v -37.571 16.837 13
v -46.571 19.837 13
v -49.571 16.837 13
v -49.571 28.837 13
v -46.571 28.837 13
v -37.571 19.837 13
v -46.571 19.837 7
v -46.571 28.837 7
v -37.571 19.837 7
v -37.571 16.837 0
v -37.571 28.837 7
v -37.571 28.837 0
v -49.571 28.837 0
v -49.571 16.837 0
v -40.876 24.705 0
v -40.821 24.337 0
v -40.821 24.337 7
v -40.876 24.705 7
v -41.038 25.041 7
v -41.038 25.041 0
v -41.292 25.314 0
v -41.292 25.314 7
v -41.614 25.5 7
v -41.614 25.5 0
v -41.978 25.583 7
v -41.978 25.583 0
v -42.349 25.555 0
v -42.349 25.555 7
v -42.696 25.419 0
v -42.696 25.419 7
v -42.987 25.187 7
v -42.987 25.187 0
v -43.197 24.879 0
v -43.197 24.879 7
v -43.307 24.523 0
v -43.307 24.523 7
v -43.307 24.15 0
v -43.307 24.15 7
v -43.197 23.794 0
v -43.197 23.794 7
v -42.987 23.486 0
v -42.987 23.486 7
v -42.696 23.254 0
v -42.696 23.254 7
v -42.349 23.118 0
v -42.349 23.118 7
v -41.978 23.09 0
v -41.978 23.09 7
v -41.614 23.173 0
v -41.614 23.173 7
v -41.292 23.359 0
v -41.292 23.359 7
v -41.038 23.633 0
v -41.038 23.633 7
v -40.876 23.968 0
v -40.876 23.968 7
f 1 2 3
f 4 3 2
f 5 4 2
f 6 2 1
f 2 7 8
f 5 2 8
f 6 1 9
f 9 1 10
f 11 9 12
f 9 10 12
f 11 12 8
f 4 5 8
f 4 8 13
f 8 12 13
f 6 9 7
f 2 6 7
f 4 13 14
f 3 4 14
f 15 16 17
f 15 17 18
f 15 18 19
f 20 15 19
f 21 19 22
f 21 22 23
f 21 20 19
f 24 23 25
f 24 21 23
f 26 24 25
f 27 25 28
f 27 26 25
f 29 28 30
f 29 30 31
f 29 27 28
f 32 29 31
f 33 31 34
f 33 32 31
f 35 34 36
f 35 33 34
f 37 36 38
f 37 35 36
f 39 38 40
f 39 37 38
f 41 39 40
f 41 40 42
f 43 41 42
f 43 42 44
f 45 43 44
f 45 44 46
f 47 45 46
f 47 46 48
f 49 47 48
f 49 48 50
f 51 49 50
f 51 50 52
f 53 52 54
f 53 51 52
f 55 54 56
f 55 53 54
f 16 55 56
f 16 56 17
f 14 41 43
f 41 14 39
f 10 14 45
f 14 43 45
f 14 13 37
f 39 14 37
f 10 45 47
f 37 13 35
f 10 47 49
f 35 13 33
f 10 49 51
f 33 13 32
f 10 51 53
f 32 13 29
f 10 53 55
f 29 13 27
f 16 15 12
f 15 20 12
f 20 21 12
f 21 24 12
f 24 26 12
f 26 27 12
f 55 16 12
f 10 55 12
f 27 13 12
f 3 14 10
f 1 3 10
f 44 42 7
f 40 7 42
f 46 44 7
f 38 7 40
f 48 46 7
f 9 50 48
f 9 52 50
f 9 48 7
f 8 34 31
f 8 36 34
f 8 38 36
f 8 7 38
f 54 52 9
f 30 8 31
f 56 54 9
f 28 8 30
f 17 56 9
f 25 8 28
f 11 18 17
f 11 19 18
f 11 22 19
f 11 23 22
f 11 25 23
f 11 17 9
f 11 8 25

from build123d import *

# Parameters (mm, degrees)
F0_W     = 9
F0_H     = 9
F0_R     = 1.25
F1_DEPTH = 7
F2_DEPTH = 13


with BuildPart() as f1:
    # F0 (on Top) → F1 (new body)
    with BuildSketch(Plane.XY):
        with Locations((-42.070914, 24.336671)):
            Rectangle(F0_W, F0_H)
        with Locations((-42.070914, 24.336671)):
            Circle(F0_R, mode=Mode.SUBTRACT)
        Polygon((-49.570914, 16.836671), (-37.570914, 16.836671), (-37.570914, 19.836671), (-46.570914, 19.836671), (-46.570914, 28.836671), (-49.570914, 28.836671), align=None)
    extrude(amount=F1_DEPTH)

    # F0 (on Top) → F2 (join)
    with BuildSketch(Plane.XY):
        Polygon((-49.570914, 16.836671), (-37.570914, 16.836671), (-37.570914, 19.836671), (-46.570914, 19.836671), (-46.570914, 28.836671), (-49.570914, 28.836671), align=None)
    extrude(amount=F2_DEPTH)


solid = f1.part
